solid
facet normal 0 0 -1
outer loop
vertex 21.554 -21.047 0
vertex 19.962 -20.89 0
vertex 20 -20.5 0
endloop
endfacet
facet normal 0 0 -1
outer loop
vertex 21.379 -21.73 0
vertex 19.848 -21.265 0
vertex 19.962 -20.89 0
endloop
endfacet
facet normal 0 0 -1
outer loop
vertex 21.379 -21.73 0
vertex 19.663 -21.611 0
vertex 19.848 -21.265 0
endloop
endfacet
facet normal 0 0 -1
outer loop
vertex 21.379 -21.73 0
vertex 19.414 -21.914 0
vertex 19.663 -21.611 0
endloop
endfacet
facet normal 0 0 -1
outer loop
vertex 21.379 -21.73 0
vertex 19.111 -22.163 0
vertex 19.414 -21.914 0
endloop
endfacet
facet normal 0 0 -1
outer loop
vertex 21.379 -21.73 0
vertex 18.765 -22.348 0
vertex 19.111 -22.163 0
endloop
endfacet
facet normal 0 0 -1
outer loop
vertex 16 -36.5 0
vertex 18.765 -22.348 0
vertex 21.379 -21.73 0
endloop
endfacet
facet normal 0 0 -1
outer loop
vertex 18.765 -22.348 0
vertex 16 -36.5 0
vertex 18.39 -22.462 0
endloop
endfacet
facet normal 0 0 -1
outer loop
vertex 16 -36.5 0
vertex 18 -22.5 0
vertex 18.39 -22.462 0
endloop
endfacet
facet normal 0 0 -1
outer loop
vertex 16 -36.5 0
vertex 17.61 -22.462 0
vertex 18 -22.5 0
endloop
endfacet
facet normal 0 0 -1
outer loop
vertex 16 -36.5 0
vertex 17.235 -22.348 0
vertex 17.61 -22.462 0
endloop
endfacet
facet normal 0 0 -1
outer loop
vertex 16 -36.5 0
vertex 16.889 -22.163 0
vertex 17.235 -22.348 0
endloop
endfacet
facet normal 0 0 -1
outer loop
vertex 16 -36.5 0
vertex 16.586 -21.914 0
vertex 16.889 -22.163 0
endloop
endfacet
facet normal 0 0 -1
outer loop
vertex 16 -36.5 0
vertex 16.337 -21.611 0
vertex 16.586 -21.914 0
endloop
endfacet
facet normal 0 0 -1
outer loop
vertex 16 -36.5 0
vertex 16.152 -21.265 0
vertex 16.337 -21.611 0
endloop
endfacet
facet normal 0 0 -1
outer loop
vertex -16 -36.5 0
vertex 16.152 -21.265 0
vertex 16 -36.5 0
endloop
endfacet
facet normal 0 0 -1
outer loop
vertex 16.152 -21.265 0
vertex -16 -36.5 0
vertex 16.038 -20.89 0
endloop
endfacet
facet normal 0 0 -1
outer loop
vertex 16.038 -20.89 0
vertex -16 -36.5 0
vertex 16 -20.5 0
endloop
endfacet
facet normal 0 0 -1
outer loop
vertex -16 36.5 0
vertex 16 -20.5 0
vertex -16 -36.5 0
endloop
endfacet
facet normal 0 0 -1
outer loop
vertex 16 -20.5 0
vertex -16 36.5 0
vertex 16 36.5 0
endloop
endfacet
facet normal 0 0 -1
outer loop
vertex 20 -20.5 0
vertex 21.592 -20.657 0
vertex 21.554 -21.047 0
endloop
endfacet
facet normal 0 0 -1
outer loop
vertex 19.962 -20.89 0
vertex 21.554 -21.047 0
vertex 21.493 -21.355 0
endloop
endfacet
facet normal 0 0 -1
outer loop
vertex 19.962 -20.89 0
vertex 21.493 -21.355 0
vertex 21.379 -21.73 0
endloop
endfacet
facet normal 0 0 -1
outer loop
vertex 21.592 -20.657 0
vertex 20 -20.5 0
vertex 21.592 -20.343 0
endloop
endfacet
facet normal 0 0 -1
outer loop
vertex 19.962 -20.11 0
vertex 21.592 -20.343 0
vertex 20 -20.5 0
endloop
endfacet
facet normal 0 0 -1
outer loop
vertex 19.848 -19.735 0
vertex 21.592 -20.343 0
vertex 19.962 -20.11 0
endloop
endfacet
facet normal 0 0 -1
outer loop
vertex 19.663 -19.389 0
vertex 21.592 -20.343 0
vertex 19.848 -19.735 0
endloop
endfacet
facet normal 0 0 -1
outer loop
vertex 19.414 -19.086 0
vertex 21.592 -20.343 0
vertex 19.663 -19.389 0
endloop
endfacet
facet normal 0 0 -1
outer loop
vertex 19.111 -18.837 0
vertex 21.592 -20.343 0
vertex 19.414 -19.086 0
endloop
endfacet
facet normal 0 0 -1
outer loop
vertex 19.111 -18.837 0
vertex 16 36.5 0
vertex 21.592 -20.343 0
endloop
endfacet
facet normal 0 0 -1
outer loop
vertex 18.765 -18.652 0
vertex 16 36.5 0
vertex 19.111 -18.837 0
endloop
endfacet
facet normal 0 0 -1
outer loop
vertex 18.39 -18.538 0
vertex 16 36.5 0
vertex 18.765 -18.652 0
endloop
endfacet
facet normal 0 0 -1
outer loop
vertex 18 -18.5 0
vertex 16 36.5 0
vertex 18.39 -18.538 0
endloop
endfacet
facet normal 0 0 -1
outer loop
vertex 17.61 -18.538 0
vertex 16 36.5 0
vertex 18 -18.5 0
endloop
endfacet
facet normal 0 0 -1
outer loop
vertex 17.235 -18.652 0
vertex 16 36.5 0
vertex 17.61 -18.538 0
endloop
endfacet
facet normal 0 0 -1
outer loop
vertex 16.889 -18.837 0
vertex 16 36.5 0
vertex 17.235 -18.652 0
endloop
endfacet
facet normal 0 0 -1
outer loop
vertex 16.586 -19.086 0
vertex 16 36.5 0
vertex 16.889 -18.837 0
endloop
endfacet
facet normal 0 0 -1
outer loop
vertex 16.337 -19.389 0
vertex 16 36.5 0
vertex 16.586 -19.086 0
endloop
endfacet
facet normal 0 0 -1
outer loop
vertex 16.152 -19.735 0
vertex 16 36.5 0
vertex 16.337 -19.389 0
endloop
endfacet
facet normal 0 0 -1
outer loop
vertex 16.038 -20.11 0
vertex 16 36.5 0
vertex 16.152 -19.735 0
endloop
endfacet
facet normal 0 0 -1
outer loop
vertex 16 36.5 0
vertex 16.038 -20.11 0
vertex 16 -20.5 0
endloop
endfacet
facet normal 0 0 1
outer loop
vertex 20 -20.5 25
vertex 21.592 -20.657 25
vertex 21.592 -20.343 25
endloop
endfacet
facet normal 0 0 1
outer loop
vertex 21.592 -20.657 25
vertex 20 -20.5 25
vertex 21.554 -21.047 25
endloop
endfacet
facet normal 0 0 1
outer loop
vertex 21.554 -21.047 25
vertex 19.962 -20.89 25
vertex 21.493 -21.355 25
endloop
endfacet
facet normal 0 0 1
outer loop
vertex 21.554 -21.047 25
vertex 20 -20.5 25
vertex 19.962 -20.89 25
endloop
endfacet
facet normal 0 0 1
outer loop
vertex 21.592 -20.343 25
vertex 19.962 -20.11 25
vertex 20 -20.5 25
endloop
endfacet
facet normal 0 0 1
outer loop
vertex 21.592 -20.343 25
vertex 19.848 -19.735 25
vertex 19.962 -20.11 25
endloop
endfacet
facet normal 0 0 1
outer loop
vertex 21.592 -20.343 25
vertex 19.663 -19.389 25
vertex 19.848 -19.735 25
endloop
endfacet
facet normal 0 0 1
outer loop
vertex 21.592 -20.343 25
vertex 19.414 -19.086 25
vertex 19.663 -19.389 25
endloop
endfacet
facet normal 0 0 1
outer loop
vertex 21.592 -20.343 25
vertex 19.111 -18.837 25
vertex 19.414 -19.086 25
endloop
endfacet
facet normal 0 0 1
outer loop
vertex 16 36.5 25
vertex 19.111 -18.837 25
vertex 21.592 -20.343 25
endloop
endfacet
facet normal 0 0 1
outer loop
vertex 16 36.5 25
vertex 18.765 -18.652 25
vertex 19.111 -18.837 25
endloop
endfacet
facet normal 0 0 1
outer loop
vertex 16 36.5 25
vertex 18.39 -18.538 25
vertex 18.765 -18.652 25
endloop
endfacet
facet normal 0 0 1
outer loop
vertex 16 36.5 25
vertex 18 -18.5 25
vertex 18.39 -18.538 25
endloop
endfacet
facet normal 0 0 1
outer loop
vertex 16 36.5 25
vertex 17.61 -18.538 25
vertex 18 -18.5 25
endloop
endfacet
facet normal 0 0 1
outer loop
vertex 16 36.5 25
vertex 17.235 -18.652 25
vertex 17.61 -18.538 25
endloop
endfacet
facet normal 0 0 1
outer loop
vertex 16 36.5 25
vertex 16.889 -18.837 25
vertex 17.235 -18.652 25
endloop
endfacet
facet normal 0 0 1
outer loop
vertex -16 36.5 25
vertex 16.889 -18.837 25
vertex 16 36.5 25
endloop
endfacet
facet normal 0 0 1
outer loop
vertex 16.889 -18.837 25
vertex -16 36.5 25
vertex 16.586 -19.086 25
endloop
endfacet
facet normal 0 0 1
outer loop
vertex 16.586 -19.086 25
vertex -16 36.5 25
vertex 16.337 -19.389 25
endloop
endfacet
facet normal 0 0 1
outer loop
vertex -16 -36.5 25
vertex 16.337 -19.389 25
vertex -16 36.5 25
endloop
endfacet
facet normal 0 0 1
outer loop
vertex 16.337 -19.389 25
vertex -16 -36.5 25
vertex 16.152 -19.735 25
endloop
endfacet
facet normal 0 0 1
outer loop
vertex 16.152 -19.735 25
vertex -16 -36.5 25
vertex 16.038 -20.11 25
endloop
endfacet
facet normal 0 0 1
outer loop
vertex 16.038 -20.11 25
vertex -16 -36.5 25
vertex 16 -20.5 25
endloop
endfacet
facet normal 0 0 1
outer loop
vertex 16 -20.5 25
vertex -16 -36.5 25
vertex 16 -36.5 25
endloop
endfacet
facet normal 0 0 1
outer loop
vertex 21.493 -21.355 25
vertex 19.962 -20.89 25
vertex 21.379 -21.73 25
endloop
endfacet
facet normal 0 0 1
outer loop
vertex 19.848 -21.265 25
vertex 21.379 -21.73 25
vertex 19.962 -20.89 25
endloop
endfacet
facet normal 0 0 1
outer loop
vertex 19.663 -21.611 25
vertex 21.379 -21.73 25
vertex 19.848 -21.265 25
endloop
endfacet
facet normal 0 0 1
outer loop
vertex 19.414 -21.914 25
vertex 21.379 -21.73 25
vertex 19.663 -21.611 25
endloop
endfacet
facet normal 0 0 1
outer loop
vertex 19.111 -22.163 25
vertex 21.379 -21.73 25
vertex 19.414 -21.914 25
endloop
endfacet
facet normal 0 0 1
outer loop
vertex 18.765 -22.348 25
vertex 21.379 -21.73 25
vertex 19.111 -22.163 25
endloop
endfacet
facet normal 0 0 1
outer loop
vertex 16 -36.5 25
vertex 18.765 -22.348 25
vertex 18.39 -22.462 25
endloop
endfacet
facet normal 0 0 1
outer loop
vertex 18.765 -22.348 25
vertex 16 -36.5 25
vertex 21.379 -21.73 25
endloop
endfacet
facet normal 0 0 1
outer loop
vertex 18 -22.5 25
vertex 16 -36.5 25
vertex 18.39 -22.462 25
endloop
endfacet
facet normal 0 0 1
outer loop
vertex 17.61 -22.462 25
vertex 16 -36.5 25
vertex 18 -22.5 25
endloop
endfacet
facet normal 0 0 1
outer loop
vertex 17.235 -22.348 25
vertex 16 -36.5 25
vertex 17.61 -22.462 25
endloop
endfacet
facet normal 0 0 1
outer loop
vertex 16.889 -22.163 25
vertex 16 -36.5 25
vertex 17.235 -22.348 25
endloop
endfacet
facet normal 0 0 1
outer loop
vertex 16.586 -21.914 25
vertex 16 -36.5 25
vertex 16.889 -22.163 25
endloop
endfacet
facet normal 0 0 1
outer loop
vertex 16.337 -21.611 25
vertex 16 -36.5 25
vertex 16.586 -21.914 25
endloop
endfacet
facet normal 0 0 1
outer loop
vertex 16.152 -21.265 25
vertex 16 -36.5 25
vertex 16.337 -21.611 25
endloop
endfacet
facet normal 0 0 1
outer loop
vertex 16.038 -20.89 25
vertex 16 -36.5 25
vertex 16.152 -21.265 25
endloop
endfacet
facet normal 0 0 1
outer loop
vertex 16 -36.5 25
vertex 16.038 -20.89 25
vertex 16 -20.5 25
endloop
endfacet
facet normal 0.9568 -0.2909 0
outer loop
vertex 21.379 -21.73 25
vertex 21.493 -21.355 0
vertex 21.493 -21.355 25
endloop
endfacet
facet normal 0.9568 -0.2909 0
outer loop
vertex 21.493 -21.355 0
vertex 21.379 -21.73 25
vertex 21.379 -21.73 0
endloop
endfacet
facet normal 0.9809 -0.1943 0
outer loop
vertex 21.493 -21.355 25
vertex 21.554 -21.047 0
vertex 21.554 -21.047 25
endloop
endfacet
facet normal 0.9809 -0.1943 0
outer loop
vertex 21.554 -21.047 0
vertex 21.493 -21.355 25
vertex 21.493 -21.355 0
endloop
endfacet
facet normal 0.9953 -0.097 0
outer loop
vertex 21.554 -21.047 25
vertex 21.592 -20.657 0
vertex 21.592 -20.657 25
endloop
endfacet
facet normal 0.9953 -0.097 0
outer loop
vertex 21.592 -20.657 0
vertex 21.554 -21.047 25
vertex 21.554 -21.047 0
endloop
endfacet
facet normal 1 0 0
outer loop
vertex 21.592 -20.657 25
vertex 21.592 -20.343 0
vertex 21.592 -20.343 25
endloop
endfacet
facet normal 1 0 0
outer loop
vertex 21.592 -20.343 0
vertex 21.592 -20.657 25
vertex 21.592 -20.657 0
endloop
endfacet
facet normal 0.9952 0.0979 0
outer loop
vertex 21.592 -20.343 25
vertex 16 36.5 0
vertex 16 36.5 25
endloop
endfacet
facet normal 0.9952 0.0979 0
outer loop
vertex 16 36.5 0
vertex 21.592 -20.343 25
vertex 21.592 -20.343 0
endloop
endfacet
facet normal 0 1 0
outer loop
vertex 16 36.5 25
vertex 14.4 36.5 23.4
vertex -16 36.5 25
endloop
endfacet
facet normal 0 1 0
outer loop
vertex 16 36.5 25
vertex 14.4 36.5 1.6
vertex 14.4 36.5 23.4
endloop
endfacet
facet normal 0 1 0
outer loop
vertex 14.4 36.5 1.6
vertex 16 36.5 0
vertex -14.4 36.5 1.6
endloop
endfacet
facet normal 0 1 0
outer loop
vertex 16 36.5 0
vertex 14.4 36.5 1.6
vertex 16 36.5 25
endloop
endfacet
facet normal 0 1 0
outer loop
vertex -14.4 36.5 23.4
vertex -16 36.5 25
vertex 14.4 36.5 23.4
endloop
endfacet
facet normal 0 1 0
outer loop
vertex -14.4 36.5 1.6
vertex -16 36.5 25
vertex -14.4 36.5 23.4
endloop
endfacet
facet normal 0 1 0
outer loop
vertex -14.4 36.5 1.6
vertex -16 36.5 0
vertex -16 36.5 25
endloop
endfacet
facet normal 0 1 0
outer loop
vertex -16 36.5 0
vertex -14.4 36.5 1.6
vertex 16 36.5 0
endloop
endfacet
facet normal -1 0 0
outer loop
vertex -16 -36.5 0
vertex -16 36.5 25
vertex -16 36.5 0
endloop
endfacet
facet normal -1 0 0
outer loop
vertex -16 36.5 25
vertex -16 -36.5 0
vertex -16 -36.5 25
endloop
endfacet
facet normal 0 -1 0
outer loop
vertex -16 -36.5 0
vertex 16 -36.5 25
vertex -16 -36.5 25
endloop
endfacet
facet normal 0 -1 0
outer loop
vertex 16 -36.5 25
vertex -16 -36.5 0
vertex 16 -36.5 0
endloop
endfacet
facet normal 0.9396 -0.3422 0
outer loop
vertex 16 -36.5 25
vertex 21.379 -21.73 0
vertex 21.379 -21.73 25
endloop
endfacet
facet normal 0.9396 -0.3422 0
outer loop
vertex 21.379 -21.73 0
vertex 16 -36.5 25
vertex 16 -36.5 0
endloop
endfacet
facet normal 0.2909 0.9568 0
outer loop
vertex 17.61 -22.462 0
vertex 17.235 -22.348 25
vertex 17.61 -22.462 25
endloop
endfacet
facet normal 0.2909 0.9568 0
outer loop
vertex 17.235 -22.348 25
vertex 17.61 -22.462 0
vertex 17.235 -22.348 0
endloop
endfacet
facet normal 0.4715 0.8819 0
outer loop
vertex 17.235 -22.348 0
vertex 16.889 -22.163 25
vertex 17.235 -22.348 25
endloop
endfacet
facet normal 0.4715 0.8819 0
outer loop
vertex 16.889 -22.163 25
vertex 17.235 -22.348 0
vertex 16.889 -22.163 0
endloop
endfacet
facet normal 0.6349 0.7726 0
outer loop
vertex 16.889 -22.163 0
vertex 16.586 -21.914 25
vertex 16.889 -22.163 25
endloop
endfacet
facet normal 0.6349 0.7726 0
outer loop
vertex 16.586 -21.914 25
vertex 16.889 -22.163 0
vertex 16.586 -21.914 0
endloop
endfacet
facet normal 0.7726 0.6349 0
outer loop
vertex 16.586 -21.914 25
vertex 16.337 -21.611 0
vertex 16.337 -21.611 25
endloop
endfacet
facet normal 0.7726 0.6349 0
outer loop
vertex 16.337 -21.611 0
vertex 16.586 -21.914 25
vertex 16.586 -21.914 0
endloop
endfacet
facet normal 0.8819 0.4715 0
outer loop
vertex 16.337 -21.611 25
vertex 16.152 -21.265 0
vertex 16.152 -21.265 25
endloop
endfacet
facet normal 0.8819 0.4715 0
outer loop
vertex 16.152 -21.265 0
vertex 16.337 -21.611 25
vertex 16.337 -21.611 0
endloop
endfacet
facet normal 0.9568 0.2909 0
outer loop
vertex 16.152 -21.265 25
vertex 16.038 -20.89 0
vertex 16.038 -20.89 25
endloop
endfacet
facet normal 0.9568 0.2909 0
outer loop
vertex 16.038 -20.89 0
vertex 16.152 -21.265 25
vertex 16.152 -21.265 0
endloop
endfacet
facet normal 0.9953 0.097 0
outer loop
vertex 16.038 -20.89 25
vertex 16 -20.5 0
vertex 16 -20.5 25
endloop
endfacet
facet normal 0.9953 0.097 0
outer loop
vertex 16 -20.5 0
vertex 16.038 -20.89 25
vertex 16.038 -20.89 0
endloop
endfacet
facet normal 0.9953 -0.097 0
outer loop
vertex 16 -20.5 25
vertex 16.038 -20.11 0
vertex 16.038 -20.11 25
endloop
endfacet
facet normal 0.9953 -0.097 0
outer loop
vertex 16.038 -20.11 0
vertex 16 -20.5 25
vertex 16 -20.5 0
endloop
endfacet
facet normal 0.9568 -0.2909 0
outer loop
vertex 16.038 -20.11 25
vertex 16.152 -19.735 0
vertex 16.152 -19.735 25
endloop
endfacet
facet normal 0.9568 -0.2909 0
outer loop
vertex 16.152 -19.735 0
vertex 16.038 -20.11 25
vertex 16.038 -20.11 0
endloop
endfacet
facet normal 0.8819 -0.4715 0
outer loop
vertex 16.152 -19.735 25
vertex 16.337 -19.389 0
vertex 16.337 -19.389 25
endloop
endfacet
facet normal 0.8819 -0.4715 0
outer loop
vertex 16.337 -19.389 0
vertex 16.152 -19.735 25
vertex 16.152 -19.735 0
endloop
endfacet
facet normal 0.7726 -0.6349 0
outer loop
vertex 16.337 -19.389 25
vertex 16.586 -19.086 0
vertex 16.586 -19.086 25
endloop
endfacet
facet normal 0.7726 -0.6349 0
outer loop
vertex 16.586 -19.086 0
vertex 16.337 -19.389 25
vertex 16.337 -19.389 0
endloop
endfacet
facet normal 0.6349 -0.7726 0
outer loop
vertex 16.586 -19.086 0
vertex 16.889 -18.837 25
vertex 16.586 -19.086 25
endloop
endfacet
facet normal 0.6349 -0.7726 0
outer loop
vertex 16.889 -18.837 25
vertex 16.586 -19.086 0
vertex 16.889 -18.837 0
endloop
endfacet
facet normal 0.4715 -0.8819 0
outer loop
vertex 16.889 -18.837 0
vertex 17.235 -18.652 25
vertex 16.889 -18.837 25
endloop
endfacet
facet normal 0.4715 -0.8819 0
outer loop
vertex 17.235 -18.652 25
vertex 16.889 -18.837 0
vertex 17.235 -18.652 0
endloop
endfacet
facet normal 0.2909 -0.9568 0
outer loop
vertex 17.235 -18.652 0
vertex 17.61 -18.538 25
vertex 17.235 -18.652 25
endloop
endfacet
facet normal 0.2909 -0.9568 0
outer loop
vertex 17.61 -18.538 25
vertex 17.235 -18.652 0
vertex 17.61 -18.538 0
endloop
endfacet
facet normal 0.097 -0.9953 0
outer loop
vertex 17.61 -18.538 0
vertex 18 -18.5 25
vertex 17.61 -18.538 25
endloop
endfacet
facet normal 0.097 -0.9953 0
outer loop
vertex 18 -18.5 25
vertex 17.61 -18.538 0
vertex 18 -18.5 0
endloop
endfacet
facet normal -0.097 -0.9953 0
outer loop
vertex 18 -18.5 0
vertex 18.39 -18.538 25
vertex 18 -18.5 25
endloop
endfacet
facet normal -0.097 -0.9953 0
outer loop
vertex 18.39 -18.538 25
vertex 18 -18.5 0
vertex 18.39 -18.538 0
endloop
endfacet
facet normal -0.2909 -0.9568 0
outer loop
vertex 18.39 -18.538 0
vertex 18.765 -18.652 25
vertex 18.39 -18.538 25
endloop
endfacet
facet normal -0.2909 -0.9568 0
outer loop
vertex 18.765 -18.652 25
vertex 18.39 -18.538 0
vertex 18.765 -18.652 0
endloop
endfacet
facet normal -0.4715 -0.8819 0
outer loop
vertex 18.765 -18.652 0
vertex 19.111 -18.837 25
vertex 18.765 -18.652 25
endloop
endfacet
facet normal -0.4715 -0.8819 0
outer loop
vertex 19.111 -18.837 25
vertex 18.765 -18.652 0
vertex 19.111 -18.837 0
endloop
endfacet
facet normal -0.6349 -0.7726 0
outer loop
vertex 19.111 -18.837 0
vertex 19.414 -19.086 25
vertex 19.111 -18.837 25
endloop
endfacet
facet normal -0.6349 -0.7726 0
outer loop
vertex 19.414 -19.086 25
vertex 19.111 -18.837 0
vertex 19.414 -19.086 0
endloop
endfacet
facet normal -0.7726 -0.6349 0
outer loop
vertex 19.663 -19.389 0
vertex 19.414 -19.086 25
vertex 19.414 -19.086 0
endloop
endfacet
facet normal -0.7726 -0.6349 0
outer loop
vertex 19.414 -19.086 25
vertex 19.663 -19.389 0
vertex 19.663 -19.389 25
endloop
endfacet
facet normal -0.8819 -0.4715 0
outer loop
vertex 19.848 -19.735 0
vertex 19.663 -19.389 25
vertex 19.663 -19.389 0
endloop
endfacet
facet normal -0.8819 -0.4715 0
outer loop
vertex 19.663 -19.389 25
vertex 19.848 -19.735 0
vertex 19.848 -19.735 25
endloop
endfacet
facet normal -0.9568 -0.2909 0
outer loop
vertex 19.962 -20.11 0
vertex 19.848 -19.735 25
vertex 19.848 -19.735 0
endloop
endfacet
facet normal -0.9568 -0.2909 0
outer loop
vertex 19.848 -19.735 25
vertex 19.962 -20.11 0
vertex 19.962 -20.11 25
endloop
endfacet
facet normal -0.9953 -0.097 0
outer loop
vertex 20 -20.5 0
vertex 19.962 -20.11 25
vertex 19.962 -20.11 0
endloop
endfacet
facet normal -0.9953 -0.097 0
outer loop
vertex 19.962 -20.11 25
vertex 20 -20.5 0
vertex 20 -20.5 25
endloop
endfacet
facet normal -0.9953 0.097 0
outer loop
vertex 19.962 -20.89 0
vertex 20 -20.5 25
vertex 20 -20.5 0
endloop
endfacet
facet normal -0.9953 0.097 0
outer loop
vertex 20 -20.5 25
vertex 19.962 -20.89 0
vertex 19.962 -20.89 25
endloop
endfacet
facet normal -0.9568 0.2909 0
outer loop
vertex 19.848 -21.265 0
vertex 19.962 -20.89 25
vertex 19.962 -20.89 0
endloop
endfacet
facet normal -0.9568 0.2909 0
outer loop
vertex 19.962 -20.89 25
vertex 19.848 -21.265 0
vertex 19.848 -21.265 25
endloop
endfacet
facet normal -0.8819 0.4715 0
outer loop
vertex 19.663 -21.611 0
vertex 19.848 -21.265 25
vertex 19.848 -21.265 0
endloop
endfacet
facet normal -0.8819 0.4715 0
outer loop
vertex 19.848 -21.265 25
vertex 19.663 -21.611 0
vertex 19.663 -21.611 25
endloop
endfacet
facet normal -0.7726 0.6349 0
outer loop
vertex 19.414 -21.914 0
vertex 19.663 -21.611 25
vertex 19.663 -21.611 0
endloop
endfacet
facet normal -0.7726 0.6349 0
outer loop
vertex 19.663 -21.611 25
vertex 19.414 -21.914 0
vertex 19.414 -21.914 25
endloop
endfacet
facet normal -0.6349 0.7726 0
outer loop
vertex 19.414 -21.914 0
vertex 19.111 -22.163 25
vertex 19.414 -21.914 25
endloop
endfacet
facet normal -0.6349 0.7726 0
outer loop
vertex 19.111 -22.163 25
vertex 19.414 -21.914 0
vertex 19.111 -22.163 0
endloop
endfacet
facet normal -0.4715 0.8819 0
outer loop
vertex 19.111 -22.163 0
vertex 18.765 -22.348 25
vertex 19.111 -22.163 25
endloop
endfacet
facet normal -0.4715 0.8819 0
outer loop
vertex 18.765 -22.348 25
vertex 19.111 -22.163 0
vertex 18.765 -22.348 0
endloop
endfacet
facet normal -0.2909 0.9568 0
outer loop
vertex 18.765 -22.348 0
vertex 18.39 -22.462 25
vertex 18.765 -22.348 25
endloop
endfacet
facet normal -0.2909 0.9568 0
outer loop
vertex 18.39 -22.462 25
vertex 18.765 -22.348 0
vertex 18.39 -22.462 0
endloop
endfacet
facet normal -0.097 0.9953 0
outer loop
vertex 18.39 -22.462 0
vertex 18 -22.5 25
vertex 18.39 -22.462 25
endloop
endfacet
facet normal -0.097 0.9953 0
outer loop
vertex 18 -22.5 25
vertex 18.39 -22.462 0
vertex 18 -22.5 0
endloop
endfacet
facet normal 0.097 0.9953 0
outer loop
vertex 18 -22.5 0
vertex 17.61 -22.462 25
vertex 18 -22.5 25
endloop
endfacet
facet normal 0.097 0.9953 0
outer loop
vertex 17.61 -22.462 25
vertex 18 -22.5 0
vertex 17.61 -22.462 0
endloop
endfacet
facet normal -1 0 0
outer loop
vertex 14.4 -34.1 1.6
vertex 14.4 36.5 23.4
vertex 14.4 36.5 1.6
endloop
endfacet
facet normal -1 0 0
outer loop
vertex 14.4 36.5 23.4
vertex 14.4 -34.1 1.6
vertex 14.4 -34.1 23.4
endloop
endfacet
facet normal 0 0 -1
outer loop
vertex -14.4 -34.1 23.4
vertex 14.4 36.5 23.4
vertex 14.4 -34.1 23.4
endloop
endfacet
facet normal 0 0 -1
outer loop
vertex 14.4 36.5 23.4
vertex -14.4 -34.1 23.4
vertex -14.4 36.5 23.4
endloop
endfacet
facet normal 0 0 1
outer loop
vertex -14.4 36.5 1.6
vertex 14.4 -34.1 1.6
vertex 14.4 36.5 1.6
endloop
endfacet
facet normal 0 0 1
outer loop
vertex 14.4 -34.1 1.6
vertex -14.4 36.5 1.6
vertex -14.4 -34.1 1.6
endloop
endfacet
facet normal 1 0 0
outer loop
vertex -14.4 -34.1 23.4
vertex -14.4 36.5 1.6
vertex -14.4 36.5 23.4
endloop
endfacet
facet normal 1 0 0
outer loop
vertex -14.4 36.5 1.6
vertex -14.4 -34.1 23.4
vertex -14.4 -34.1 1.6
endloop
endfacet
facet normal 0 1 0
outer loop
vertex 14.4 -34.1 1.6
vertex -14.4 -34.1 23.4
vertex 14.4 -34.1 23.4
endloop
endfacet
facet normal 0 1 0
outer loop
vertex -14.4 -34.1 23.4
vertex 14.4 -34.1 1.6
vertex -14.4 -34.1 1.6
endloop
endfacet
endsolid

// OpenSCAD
// Loose solder wire holder

$fn = 32;

holder_len = 32.0;
holder_wid = 25.0;
holder_h = 73.0;
screw_dia = 4.0;
screw_v_offset = 57.0;
screw_h_offset = 34.0;
wall_thick = 1.6;

module holder2D() {
    difference() {
        hull() {
            square([holder_len, holder_h], center=true);
            translate([screw_h_offset-holder_len/2,holder_h/2-screw_v_offset,0])
            offset(wall_thick)
            circle(d=screw_dia);
        }
        translate([screw_h_offset-holder_len/2,holder_h/2-screw_v_offset,0])
        circle(d=screw_dia);
    }
}

module holder3D() {
    difference() {
        linear_extrude(holder_wid)
        holder2D();
        translate([0,wall_thick,holder_wid/2])
        cube([holder_len-2*wall_thick, holder_h-wall_thick, holder_wid-2*wall_thick], center=true);
    }
}

holder3D();
